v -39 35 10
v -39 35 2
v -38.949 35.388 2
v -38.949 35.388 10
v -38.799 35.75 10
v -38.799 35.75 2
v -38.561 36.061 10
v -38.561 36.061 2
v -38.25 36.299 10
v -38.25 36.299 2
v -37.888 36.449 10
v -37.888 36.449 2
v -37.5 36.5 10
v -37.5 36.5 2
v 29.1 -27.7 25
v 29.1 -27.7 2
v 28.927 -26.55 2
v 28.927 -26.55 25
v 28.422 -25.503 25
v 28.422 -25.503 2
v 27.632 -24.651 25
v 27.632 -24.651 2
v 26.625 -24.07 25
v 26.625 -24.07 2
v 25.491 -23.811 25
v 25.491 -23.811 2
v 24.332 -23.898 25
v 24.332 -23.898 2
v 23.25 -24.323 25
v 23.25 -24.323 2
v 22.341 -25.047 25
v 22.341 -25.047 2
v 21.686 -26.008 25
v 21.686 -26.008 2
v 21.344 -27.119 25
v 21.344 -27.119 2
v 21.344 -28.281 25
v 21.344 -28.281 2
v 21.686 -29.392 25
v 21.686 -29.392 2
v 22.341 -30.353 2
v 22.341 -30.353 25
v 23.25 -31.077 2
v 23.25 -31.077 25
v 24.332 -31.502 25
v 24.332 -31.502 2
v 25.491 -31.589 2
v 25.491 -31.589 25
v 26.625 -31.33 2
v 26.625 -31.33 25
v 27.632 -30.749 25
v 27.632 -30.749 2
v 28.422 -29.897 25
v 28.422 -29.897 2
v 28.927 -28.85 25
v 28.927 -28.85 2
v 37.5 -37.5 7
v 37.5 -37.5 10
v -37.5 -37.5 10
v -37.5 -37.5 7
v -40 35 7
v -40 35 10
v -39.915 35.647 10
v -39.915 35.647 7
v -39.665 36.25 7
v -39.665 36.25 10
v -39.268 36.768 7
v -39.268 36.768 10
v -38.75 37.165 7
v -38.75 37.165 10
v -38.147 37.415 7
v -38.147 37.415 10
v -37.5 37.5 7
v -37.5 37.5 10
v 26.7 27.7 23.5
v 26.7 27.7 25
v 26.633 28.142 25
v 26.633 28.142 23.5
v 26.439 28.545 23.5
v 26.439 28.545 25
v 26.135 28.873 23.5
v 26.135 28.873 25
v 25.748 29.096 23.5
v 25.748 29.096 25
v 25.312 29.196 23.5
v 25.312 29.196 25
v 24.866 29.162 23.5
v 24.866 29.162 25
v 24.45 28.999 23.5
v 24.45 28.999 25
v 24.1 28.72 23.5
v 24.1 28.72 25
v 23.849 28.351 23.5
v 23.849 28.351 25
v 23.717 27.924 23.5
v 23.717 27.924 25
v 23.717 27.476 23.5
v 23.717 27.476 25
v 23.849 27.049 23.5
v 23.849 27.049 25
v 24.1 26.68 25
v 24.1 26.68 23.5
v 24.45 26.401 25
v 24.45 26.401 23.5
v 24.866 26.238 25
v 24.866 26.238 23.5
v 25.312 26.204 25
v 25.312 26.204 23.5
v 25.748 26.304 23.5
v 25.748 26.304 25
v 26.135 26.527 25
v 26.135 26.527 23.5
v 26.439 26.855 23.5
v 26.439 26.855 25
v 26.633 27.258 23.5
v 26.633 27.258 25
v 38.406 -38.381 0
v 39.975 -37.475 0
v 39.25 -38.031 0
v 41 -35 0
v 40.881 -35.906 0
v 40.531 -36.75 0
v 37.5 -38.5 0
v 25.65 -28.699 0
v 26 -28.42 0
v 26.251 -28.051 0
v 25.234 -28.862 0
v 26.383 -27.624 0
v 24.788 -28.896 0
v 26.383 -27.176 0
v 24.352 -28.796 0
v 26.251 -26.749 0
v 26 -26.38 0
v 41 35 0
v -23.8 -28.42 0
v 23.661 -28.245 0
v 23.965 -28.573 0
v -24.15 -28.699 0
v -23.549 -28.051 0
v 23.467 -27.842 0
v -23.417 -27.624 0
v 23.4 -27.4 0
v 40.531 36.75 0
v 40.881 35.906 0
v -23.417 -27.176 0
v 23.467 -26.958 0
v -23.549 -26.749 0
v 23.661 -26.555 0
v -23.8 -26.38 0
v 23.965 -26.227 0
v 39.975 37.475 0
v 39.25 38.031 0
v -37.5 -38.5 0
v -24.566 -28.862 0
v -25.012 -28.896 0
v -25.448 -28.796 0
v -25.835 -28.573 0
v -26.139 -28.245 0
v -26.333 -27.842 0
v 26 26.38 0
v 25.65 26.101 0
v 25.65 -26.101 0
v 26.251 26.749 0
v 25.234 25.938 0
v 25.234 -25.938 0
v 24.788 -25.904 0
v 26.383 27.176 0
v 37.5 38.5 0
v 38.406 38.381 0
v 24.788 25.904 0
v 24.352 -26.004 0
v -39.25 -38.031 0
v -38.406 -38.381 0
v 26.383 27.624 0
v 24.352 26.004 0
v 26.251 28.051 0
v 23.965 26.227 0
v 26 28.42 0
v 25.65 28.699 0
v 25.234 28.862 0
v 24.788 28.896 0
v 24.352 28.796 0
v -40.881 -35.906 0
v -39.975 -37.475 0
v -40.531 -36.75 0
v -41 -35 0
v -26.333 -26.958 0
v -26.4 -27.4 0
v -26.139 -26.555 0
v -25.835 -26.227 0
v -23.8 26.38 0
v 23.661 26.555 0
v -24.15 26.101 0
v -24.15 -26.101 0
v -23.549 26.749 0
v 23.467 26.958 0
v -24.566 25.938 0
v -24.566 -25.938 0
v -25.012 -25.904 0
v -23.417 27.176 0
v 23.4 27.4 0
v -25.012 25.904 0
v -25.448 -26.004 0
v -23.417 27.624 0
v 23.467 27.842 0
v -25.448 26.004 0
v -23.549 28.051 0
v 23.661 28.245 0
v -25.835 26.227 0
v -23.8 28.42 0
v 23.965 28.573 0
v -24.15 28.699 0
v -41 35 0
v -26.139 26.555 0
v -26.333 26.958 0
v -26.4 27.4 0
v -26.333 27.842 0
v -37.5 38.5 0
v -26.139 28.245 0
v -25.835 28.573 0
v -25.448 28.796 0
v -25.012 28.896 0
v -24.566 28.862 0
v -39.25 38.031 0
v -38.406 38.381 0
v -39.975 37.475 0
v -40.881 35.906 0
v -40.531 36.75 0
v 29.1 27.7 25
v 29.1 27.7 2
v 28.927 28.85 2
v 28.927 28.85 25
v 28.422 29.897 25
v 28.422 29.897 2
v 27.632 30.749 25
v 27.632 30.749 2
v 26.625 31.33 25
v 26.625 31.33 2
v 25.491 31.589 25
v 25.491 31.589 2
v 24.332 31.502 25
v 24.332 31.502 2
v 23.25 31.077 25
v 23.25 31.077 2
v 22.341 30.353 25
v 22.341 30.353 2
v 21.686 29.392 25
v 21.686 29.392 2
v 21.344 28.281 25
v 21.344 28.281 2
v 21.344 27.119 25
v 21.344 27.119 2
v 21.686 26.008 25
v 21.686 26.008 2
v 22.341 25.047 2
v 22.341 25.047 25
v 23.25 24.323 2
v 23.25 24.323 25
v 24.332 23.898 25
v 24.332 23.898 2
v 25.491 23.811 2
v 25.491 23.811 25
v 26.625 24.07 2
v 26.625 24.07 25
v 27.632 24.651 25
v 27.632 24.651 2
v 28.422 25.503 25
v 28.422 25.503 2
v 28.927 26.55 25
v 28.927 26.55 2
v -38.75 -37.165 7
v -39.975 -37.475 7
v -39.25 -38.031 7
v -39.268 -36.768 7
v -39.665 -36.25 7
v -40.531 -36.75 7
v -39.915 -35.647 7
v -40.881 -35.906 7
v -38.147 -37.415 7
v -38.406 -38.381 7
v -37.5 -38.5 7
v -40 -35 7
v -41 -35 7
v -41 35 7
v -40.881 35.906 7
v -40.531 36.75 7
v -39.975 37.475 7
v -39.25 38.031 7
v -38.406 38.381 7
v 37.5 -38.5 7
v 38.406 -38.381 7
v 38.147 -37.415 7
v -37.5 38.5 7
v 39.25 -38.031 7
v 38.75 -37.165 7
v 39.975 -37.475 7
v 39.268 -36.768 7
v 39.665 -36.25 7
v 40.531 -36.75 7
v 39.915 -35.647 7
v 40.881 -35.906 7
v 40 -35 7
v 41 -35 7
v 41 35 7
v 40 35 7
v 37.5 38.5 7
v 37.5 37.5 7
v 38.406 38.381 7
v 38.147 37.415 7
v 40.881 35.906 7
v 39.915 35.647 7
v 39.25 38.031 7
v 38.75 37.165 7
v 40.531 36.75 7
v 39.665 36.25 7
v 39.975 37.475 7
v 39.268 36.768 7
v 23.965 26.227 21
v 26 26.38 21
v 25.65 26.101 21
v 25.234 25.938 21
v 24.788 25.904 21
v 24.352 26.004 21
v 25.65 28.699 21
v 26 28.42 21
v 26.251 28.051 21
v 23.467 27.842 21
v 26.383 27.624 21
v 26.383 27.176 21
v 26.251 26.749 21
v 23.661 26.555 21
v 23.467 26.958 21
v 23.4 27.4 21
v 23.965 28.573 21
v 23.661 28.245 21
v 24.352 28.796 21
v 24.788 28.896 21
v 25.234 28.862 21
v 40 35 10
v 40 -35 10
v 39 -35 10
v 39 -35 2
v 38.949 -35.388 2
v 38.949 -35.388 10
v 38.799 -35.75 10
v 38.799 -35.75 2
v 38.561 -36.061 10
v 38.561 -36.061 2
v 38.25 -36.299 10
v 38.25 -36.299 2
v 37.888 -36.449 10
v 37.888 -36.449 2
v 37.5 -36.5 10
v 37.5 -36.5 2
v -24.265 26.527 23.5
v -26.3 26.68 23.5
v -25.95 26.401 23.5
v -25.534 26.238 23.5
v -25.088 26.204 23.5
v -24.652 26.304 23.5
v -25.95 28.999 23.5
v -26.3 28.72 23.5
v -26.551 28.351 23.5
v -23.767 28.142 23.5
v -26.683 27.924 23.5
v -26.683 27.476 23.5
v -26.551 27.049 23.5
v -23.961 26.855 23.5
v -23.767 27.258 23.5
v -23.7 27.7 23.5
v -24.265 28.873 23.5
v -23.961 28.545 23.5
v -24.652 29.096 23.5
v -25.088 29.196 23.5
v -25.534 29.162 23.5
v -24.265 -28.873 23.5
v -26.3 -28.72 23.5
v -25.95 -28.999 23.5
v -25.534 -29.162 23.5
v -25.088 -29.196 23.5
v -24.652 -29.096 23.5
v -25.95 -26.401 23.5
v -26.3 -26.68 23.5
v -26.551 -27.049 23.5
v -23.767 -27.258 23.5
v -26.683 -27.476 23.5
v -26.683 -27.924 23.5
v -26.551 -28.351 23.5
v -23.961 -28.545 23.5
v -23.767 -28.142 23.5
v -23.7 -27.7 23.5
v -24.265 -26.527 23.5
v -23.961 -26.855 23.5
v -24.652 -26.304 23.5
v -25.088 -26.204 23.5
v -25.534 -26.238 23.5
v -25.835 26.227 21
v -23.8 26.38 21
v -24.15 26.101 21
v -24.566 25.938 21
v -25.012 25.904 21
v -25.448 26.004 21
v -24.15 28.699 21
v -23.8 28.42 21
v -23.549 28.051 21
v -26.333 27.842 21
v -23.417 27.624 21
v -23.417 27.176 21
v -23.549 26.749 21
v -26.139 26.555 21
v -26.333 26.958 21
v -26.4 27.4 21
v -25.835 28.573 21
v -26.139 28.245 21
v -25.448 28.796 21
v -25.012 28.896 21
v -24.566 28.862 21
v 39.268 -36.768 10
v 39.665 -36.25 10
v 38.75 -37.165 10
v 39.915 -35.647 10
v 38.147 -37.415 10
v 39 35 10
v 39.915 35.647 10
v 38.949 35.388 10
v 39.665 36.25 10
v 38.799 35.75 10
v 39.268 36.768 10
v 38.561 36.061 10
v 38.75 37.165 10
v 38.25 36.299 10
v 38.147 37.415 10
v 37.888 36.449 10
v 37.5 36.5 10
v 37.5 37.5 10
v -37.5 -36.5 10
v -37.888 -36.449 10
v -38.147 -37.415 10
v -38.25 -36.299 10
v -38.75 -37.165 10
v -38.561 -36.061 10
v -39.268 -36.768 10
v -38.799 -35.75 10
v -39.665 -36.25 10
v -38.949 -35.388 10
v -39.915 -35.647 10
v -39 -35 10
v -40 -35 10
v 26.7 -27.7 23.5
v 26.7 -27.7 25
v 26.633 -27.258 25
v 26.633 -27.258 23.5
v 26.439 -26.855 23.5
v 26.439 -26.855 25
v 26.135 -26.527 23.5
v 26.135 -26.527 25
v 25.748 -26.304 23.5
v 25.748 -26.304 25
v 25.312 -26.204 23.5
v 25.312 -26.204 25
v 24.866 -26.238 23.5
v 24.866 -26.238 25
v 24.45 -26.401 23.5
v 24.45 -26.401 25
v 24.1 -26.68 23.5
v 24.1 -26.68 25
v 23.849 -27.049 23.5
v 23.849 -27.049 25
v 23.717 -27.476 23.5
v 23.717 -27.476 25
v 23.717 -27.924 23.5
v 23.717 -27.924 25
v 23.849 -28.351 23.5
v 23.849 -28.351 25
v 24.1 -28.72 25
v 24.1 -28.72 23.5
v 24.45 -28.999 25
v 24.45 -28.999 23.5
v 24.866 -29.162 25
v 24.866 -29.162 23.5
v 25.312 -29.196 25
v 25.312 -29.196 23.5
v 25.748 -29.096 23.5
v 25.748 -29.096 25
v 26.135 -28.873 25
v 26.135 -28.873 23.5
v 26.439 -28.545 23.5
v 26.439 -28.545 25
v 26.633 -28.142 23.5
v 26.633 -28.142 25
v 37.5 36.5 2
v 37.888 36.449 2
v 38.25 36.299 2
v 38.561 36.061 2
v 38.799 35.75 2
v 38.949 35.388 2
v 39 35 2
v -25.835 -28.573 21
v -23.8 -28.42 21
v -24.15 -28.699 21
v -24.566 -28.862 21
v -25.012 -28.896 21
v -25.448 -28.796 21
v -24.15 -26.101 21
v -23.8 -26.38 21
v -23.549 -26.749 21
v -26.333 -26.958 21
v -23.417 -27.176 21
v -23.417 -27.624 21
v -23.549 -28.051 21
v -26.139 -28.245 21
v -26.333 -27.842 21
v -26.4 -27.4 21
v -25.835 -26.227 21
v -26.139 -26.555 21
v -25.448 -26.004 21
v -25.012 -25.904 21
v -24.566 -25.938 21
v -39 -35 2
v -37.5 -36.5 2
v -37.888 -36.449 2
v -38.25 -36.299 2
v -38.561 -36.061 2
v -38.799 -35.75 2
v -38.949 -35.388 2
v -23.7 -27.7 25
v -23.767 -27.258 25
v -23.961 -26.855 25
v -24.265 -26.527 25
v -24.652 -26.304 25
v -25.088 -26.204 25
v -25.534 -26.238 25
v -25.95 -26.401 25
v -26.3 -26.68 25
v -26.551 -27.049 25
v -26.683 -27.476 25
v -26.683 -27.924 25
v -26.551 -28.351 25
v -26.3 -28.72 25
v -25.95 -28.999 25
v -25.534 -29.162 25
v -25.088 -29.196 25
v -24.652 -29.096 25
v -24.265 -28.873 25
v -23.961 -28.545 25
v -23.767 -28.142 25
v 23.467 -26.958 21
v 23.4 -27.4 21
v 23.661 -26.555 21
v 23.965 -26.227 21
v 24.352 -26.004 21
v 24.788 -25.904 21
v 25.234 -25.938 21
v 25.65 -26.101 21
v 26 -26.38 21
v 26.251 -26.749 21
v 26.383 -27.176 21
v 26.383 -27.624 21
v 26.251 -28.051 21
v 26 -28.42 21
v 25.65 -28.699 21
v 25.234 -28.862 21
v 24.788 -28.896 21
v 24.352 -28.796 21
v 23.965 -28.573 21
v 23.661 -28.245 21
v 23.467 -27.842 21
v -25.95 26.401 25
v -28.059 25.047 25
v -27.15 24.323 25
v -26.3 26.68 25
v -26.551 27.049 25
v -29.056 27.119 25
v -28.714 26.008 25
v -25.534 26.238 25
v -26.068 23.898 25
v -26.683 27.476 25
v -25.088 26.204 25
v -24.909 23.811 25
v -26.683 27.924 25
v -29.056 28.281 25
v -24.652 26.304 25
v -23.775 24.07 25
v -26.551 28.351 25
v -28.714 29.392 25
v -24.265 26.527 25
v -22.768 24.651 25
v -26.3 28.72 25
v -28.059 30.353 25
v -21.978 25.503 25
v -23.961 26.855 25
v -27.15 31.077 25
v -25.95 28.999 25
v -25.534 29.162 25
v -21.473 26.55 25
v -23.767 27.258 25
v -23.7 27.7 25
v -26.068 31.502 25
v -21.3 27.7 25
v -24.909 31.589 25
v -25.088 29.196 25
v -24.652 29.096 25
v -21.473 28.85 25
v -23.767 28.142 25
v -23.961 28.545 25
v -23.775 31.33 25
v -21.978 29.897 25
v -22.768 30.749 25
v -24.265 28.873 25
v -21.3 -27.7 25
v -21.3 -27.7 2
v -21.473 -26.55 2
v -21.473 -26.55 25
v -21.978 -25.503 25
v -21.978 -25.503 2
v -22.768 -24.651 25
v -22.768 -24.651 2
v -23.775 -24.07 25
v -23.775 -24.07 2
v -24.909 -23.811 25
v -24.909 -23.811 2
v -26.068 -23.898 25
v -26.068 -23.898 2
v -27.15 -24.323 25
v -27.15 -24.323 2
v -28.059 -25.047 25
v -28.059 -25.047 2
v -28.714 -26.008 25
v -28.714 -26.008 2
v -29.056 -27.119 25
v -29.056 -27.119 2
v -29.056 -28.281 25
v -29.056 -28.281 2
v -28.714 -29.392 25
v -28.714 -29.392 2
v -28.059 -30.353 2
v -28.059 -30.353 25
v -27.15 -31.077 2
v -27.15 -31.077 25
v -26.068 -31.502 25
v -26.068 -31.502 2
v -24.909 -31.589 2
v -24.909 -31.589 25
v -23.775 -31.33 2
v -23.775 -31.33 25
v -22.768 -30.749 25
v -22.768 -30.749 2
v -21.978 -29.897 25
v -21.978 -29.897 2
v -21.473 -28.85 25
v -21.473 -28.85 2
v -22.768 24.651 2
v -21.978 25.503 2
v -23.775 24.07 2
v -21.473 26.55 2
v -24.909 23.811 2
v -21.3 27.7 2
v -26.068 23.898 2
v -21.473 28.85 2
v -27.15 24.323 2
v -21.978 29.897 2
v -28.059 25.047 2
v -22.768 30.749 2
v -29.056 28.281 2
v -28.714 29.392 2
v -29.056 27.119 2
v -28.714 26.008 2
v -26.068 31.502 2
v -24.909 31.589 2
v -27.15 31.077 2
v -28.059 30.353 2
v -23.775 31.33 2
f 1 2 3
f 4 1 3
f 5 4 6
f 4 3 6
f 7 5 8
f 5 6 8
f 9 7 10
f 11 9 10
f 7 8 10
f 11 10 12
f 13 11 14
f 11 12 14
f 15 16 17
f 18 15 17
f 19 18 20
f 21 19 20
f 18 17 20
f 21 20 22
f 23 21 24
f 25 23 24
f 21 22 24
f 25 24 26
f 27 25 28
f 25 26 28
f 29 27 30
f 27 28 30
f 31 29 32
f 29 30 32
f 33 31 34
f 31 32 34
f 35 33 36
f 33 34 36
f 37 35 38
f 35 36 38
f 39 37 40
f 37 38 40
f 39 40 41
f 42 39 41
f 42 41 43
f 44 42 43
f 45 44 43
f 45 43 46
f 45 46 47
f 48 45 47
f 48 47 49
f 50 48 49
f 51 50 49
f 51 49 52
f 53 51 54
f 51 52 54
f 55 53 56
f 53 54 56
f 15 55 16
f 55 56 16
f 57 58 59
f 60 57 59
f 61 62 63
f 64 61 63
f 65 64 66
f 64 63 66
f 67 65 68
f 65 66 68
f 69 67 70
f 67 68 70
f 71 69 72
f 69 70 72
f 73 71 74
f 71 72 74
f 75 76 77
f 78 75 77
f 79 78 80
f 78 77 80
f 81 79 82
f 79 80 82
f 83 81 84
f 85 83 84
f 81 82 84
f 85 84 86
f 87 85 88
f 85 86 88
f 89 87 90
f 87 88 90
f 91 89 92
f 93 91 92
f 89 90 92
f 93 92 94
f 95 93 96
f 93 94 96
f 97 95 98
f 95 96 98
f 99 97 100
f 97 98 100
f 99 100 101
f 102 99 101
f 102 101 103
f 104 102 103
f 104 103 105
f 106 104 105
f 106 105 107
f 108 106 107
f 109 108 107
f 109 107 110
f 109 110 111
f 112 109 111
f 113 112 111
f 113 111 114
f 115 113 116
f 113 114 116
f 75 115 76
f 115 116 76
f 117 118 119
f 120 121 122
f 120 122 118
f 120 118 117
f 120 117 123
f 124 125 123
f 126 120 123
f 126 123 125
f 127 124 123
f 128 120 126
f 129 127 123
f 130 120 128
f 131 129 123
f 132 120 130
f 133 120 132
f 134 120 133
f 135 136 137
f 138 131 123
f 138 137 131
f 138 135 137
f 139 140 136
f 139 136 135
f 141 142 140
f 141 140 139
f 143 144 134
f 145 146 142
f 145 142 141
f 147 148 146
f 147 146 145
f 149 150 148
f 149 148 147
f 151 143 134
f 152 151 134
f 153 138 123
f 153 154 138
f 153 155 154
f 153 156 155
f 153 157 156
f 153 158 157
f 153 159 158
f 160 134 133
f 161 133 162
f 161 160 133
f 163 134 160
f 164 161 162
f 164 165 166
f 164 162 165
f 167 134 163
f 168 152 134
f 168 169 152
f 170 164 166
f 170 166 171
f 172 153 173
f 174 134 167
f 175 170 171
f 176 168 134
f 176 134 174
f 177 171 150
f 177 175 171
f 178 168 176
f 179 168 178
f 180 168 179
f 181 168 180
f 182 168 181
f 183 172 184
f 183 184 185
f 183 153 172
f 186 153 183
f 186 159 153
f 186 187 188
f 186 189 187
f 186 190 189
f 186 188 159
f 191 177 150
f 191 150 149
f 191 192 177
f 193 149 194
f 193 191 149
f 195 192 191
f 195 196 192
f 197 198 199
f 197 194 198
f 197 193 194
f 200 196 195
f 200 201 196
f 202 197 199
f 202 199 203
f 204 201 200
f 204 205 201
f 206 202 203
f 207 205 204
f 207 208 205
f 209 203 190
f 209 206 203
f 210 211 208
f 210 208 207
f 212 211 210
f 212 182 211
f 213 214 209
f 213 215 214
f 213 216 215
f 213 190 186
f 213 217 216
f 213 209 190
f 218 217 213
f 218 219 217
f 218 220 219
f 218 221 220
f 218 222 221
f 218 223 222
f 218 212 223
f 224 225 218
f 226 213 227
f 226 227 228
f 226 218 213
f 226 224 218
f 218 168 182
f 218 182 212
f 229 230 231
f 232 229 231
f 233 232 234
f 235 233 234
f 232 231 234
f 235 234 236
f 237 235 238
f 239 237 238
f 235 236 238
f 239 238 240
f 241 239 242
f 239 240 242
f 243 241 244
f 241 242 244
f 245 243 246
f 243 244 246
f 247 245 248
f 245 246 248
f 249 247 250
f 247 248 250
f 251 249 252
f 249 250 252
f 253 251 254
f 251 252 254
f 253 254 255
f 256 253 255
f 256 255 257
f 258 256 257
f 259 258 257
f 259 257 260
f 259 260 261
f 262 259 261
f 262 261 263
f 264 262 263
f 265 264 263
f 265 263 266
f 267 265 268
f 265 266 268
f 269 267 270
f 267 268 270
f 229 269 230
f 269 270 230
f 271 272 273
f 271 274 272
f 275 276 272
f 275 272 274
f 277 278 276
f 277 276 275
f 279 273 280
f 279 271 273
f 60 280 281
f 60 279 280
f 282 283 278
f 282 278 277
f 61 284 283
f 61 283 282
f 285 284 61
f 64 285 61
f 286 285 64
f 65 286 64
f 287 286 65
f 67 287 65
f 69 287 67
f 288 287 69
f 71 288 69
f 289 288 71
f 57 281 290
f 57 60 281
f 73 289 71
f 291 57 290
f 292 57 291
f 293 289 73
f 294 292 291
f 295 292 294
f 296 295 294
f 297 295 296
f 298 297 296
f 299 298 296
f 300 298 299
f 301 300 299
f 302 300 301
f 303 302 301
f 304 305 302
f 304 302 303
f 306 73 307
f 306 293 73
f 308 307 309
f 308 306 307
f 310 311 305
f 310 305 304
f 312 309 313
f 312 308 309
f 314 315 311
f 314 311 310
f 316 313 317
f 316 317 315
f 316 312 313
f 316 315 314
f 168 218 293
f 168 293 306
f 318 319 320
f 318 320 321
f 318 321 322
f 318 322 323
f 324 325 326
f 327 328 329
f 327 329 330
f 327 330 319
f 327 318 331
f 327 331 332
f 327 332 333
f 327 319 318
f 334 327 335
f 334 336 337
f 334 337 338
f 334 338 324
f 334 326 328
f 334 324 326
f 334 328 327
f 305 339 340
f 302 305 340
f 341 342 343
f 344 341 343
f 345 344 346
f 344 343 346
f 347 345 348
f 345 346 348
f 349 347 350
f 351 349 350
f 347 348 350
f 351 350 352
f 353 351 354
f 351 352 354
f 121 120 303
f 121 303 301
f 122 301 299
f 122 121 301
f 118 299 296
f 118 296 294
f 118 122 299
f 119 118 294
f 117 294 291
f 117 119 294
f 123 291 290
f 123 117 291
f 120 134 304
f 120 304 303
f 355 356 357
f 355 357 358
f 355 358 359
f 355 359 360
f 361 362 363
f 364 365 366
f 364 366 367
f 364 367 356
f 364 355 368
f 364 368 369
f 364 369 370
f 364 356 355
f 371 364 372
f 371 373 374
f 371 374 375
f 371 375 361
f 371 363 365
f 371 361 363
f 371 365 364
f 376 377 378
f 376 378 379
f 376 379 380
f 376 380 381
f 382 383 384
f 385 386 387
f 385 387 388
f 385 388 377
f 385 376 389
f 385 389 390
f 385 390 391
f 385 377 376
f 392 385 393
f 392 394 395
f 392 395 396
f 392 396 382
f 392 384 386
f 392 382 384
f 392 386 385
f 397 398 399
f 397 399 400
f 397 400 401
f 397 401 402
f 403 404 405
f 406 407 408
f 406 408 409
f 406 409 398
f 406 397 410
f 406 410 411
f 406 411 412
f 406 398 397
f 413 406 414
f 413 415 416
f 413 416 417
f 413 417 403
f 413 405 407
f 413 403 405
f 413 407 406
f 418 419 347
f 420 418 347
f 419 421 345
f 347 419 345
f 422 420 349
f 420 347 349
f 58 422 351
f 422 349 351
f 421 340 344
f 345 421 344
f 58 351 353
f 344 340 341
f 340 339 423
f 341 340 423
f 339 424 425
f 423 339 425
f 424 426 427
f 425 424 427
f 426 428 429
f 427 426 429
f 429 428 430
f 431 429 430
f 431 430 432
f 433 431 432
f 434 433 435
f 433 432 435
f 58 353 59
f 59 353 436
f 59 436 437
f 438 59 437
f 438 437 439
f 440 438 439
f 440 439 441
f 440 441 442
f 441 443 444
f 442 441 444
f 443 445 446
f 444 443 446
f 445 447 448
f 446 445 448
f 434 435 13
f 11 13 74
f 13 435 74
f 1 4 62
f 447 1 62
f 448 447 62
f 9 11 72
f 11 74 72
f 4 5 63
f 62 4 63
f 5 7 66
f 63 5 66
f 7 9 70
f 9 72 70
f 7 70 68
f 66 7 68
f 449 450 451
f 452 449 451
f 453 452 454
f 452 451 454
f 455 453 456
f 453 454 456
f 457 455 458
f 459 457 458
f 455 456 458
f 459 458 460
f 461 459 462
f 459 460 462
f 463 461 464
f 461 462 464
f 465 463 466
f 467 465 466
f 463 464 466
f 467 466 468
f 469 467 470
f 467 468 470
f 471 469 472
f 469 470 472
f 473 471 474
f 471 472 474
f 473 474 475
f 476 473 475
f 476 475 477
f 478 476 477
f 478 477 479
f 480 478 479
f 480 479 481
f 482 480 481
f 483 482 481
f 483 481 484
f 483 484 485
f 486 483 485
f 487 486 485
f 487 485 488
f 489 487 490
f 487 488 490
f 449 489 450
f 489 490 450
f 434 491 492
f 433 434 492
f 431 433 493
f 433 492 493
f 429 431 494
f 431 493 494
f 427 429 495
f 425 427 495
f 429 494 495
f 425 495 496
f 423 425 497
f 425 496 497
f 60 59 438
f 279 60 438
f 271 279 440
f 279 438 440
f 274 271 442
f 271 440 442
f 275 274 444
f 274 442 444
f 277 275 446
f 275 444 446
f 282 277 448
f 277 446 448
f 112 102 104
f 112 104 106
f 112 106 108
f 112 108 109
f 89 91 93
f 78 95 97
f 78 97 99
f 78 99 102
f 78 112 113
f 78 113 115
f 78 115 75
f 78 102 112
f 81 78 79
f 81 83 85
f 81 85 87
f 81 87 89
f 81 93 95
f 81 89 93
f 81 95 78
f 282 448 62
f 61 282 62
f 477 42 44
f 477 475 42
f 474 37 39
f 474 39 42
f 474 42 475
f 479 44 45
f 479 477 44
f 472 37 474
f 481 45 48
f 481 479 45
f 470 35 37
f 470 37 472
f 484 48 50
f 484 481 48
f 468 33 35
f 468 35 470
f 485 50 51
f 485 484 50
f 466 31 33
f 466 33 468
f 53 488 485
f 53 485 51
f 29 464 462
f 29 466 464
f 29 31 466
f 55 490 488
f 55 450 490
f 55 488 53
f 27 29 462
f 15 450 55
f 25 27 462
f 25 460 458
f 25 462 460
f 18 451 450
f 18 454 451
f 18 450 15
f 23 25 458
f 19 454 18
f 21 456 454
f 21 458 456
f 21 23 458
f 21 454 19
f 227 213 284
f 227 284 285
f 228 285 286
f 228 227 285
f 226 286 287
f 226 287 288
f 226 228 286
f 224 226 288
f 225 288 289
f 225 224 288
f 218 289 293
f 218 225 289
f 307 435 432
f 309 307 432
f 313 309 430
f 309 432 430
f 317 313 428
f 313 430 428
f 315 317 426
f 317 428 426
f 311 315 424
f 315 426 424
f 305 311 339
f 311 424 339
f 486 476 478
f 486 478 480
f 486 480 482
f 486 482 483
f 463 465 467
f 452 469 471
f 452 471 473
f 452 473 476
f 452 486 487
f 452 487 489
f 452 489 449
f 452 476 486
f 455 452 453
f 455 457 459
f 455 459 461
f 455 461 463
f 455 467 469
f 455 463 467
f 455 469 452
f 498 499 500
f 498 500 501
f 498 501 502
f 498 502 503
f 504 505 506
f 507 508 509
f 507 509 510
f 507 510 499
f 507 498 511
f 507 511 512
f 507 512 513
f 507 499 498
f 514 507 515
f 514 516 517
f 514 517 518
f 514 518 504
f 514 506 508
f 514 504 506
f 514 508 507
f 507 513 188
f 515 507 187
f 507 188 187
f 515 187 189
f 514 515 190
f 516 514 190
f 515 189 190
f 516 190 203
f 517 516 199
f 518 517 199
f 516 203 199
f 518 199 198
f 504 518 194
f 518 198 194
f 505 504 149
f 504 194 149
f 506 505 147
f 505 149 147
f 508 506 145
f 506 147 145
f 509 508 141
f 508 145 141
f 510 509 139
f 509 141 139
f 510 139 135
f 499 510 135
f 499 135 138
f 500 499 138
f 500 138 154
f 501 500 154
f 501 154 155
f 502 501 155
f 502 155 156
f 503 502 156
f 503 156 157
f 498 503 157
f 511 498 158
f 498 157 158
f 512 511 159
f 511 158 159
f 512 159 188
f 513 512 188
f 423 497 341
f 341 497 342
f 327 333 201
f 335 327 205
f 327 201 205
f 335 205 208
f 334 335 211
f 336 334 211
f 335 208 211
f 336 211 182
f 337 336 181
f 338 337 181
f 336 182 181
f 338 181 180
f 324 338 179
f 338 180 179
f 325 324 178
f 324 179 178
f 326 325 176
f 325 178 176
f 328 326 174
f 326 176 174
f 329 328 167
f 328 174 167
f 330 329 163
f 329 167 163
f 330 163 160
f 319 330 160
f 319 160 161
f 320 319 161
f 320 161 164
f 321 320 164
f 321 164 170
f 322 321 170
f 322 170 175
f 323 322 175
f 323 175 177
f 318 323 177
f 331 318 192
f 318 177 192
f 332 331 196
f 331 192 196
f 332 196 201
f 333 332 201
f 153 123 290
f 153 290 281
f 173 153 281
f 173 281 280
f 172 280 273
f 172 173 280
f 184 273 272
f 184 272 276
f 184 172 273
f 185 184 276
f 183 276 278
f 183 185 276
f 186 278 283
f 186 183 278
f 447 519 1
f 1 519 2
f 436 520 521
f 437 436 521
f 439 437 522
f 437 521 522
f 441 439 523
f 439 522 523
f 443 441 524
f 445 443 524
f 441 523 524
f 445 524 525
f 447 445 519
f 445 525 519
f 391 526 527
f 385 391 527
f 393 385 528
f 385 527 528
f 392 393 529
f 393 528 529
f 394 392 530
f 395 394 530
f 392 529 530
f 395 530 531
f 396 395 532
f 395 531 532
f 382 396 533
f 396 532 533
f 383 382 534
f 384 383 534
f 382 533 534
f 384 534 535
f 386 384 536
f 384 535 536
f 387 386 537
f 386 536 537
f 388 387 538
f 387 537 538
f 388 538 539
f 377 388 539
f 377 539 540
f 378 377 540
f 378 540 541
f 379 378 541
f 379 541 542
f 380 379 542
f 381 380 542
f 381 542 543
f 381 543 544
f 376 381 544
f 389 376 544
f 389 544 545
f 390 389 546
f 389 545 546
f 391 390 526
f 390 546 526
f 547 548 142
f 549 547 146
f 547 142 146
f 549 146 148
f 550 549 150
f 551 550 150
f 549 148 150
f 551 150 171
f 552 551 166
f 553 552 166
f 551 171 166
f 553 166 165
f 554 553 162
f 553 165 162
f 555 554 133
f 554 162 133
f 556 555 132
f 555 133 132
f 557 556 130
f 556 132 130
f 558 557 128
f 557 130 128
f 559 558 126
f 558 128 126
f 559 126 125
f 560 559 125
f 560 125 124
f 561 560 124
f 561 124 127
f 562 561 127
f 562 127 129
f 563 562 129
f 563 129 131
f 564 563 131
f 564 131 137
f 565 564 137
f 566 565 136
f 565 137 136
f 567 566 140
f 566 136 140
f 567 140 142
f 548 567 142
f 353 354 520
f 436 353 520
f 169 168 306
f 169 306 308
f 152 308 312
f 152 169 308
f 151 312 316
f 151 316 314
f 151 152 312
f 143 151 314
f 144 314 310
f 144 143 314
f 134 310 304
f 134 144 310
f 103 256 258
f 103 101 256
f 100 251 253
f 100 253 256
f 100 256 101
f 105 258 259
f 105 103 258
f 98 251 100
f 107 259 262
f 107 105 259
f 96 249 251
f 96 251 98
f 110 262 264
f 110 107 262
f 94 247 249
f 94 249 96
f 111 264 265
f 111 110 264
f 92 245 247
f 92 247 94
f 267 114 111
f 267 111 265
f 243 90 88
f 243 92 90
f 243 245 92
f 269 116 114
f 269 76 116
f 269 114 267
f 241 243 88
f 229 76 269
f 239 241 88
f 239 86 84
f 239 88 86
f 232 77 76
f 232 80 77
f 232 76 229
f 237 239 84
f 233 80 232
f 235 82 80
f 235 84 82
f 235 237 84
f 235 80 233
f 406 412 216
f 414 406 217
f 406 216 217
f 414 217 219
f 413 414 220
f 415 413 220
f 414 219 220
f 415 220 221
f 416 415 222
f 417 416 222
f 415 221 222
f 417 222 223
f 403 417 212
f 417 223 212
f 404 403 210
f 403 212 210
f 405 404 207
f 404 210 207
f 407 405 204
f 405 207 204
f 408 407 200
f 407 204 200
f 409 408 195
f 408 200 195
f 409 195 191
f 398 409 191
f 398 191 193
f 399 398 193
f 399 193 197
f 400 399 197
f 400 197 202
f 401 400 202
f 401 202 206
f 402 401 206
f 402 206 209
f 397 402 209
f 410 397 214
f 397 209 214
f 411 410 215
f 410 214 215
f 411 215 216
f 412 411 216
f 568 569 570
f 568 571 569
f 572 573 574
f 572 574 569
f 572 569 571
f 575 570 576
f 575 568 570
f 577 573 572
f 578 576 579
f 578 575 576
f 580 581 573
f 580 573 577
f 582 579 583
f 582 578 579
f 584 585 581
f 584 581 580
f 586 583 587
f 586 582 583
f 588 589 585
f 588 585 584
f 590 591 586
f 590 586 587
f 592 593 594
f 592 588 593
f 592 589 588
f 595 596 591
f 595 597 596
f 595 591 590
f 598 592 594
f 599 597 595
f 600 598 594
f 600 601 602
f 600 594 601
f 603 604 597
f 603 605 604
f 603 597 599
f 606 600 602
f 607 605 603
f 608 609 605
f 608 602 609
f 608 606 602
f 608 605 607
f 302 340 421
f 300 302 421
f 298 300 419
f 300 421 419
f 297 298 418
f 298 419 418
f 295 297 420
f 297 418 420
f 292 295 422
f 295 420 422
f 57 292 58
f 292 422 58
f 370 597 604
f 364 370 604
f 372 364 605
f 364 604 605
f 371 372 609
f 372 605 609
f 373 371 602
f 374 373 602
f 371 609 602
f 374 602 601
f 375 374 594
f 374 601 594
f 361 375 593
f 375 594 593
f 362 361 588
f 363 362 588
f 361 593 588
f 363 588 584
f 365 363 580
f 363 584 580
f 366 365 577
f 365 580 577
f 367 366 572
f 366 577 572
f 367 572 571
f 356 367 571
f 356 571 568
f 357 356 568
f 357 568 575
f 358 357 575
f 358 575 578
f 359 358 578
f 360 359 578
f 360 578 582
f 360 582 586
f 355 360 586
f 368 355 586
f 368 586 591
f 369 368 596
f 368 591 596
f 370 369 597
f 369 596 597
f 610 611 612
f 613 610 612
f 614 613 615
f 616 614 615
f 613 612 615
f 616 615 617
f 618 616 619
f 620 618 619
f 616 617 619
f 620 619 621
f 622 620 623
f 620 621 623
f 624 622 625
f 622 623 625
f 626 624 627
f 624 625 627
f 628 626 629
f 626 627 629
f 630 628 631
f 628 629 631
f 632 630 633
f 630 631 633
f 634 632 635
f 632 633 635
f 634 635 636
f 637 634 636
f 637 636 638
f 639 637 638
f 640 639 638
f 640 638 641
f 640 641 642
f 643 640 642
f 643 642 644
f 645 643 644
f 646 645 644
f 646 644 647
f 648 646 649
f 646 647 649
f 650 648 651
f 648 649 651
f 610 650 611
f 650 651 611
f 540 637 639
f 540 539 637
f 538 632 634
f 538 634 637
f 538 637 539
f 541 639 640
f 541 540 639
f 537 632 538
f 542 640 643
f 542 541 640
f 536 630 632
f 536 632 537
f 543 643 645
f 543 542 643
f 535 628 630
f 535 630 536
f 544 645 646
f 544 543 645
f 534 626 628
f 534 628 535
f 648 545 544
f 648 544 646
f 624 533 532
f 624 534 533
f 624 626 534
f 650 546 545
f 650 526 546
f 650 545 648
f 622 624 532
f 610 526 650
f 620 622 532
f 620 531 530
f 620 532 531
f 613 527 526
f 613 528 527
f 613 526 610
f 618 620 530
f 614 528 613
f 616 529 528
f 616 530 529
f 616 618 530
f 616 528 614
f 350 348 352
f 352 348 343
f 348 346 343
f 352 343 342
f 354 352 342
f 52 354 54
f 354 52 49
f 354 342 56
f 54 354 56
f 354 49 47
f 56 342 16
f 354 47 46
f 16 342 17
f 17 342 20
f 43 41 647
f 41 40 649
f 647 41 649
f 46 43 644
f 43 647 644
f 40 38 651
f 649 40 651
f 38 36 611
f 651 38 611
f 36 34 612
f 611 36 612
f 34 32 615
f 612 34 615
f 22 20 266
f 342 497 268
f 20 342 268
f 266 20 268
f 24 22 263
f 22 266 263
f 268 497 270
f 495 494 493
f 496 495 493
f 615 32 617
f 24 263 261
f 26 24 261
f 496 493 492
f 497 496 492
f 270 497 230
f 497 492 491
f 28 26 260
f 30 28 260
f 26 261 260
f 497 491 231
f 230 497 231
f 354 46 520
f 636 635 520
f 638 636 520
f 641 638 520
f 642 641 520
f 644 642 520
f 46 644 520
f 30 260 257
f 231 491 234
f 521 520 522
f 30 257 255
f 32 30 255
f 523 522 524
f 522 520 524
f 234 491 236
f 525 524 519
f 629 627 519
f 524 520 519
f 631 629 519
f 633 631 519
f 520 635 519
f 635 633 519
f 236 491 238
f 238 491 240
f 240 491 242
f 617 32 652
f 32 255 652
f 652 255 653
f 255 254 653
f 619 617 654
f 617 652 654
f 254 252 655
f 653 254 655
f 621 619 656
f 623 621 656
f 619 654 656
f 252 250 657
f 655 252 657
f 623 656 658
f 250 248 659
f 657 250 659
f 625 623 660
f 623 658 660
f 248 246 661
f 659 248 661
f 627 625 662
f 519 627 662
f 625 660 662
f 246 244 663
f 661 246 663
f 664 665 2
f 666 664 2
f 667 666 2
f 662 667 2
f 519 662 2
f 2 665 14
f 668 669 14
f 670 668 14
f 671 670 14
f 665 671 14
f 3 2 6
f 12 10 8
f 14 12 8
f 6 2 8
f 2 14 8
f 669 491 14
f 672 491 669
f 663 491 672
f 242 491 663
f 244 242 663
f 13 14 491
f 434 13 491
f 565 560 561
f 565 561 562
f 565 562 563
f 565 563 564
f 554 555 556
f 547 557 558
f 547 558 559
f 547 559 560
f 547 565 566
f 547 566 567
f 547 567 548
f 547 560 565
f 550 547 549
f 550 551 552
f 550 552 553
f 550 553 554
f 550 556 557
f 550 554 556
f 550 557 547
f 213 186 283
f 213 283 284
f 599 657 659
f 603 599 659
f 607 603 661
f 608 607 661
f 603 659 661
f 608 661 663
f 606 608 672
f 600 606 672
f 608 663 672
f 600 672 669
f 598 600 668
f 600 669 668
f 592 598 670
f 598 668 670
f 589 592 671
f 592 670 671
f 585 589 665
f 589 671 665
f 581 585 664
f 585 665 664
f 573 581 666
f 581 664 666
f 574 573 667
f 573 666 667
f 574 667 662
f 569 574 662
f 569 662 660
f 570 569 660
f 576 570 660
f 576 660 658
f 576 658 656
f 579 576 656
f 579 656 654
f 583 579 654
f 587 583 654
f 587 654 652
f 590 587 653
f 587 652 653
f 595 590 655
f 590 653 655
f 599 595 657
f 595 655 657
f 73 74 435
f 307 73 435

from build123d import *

# Parameters (mm, degrees)
EXTRU_MINCE1_DEPTH      = 10
BOSS_EXTRU_1_DEPTH      = 2
ESQUISSE2_OUTSIDE_W     = 106.586
ESQUISSE2_OUTSIDE_H     = 101.586
ENL_V_MAT_EXTRU_1_DEPTH = 3
ESQUISSE3_R             = 3.9
BOSS_EXTRU_2_DEPTH      = 23
ESQUISSE9_R             = 1.5
ENL_V_MAT_EXTRU_2_DEPTH = 1.5
ESQUISSE12_R            = 1.5
ENL_V_MAT_EXTRU_3_DEPTH = 21


with BuildPart() as part:
    # Esquisse1 → Extru.-Mince1 (new body)
    with BuildSketch(Plane.XY):
        with BuildLine():
            Line((37.5, -38.5), (-37.5, -38.5))
            ThreePointArc((-37.5, -38.5), (-39.974873734, -37.474873734), (-41, -35))
            Line((-41, -35), (-41, 35))
            ThreePointArc((-41, 35), (-39.974873734, 37.474873734), (-37.5, 38.5))
            Line((-37.5, 38.5), (37.5, 38.5))
            ThreePointArc((37.5, 38.5), (39.974873734, 37.474873734), (41, 35))
            Line((41, 35), (41, -35))
            ThreePointArc((41, -35), (39.974873734, -37.474873734), (37.5, -38.5))
        make_face()
        with BuildLine():
            Line((37.5, -36.5), (-37.5, -36.5))
            ThreePointArc((-37.5, -36.5), (-38.560660172, -36.060660172), (-39, -35))
            Line((-39, -35), (-39, 35))
            ThreePointArc((-39, 35), (-38.560660172, 36.060660172), (-37.5, 36.5))
            Line((-37.5, 36.5), (37.5, 36.5))
            ThreePointArc((37.5, 36.5), (38.560660172, 36.060660172), (39, 35))
            Line((39, 35), (39, -35))
            ThreePointArc((39, -35), (38.560660172, -36.060660172), (37.5, -36.5))
        make_face(mode=Mode.SUBTRACT)
    extrude(amount=EXTRU_MINCE1_DEPTH)

    # Esquisse1<2> → Boss.-Extru.1 (add)
    with BuildSketch(Plane.XY):
        with BuildLine():
            Line((-37.5, 37.5), (37.5, 37.5))
            ThreePointArc((37.5, 37.5), (39.267766953, 36.767766953), (40, 35))
            Line((40, 35), (40, -35))
            ThreePointArc((40, -35), (39.267766953, -36.767766953), (37.5, -37.5))
            Line((37.5, -37.5), (-37.5, -37.5))
            ThreePointArc((-37.5, -37.5), (-39.267766953, -36.767766953), (-40, -35))
            Line((-40, -35), (-40, 35))
            ThreePointArc((-40, 35), (-39.267766953, 36.767766953), (-37.5, 37.5))
        make_face()
    extrude(amount=BOSS_EXTRU_1_DEPTH)

    # Esquisse2 outside → Enlèv. mat.-Extru.1 (cut)
    with BuildSketch(Plane.XY.offset(10)):
        Rectangle(ESQUISSE2_OUTSIDE_W, ESQUISSE2_OUTSIDE_H)
        with BuildLine():
            Line((-37.5, 37.5), (37.5, 37.5))
            ThreePointArc((37.5, 37.5), (39.267766953, 36.767766953), (40, 35))
            Line((40, 35), (40, -35))
            ThreePointArc((40, -35), (39.267766953, -36.767766953), (37.5, -37.5))
            Line((37.5, -37.5), (-37.5, -37.5))
            ThreePointArc((-37.5, -37.5), (-39.267766953, -36.767766953), (-40, -35))
            Line((-40, -35), (-40, 35))
            ThreePointArc((-40, 35), (-39.267766953, 36.767766953), (-37.5, 37.5))
        make_face(mode=Mode.SUBTRACT)
    extrude(amount=-ENL_V_MAT_EXTRU_1_DEPTH, mode=Mode.SUBTRACT)

    # Esquisse3 → Boss.-Extru.2 (add)
    with BuildSketch(Plane.XY.offset(2)):
        with Locations((-25.2, 27.7)):
            Circle(ESQUISSE3_R)
        with Locations((25.2, 27.7)):
            Circle(ESQUISSE3_R)
        with Locations((-25.2, -27.7)):
            Circle(ESQUISSE3_R)
        with Locations((25.2, -27.7)):
            Circle(ESQUISSE3_R)
    extrude(amount=BOSS_EXTRU_2_DEPTH)

    # Esquisse9 → Enlèv. mat.-Extru.2 (cut)
    with BuildSketch(Plane.XY.offset(25)):
        with Locations((-25.2, 27.7)):
            Circle(ESQUISSE9_R)
        with Locations((25.2, 27.7)):
            Circle(ESQUISSE9_R)
        with Locations((-25.2, -27.7)):
            Circle(ESQUISSE9_R)
        with Locations((25.2, -27.7)):
            Circle(ESQUISSE9_R)
    extrude(amount=-ENL_V_MAT_EXTRU_2_DEPTH, mode=Mode.SUBTRACT)

    # Esquisse12 → Enlèv. mat.-Extru.3 (cut)
    with BuildSketch(Plane(origin=(0, 0, 0), x_dir=(-1, 0, 0), z_dir=(0, 0, -1))):
        with Locations((24.9, 27.4)):
            Circle(ESQUISSE12_R)
        with Locations((-24.9, 27.4)):
            Circle(ESQUISSE12_R)
        with Locations((-24.9, -27.4)):
            Circle(ESQUISSE12_R)
        with Locations((24.9, -27.4)):
            Circle(ESQUISSE12_R)
    extrude(amount=-ENL_V_MAT_EXTRU_3_DEPTH, mode=Mode.SUBTRACT)


solid = part.part
